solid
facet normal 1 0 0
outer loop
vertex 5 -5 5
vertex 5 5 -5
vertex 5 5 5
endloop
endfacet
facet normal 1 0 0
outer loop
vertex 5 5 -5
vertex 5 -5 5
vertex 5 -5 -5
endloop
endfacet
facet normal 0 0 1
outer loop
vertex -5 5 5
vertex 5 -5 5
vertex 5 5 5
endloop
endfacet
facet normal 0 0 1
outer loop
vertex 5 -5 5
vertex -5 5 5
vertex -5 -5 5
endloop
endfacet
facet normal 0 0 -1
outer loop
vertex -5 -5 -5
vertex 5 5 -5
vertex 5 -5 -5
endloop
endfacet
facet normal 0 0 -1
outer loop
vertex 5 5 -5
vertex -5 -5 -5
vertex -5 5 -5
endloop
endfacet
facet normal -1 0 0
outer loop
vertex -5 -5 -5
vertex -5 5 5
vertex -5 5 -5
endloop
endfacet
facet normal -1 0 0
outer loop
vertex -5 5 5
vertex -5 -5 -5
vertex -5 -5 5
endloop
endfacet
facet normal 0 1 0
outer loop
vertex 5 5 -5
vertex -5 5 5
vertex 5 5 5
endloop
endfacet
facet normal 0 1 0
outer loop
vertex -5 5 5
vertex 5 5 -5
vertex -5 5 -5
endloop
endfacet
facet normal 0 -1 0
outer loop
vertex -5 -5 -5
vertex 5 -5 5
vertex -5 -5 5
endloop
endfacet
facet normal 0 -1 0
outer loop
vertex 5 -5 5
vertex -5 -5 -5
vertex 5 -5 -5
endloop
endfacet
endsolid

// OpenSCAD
// Begin.
union() {
rotate([0, -0, 0])
translate([0, 0, 0])
cube(size = [10, 10, 10], center = true);

rotate([0, -0, 0])
translate([0, 0, 0])
cube(size = [10, 10, 10], center = true);
}
// End.
